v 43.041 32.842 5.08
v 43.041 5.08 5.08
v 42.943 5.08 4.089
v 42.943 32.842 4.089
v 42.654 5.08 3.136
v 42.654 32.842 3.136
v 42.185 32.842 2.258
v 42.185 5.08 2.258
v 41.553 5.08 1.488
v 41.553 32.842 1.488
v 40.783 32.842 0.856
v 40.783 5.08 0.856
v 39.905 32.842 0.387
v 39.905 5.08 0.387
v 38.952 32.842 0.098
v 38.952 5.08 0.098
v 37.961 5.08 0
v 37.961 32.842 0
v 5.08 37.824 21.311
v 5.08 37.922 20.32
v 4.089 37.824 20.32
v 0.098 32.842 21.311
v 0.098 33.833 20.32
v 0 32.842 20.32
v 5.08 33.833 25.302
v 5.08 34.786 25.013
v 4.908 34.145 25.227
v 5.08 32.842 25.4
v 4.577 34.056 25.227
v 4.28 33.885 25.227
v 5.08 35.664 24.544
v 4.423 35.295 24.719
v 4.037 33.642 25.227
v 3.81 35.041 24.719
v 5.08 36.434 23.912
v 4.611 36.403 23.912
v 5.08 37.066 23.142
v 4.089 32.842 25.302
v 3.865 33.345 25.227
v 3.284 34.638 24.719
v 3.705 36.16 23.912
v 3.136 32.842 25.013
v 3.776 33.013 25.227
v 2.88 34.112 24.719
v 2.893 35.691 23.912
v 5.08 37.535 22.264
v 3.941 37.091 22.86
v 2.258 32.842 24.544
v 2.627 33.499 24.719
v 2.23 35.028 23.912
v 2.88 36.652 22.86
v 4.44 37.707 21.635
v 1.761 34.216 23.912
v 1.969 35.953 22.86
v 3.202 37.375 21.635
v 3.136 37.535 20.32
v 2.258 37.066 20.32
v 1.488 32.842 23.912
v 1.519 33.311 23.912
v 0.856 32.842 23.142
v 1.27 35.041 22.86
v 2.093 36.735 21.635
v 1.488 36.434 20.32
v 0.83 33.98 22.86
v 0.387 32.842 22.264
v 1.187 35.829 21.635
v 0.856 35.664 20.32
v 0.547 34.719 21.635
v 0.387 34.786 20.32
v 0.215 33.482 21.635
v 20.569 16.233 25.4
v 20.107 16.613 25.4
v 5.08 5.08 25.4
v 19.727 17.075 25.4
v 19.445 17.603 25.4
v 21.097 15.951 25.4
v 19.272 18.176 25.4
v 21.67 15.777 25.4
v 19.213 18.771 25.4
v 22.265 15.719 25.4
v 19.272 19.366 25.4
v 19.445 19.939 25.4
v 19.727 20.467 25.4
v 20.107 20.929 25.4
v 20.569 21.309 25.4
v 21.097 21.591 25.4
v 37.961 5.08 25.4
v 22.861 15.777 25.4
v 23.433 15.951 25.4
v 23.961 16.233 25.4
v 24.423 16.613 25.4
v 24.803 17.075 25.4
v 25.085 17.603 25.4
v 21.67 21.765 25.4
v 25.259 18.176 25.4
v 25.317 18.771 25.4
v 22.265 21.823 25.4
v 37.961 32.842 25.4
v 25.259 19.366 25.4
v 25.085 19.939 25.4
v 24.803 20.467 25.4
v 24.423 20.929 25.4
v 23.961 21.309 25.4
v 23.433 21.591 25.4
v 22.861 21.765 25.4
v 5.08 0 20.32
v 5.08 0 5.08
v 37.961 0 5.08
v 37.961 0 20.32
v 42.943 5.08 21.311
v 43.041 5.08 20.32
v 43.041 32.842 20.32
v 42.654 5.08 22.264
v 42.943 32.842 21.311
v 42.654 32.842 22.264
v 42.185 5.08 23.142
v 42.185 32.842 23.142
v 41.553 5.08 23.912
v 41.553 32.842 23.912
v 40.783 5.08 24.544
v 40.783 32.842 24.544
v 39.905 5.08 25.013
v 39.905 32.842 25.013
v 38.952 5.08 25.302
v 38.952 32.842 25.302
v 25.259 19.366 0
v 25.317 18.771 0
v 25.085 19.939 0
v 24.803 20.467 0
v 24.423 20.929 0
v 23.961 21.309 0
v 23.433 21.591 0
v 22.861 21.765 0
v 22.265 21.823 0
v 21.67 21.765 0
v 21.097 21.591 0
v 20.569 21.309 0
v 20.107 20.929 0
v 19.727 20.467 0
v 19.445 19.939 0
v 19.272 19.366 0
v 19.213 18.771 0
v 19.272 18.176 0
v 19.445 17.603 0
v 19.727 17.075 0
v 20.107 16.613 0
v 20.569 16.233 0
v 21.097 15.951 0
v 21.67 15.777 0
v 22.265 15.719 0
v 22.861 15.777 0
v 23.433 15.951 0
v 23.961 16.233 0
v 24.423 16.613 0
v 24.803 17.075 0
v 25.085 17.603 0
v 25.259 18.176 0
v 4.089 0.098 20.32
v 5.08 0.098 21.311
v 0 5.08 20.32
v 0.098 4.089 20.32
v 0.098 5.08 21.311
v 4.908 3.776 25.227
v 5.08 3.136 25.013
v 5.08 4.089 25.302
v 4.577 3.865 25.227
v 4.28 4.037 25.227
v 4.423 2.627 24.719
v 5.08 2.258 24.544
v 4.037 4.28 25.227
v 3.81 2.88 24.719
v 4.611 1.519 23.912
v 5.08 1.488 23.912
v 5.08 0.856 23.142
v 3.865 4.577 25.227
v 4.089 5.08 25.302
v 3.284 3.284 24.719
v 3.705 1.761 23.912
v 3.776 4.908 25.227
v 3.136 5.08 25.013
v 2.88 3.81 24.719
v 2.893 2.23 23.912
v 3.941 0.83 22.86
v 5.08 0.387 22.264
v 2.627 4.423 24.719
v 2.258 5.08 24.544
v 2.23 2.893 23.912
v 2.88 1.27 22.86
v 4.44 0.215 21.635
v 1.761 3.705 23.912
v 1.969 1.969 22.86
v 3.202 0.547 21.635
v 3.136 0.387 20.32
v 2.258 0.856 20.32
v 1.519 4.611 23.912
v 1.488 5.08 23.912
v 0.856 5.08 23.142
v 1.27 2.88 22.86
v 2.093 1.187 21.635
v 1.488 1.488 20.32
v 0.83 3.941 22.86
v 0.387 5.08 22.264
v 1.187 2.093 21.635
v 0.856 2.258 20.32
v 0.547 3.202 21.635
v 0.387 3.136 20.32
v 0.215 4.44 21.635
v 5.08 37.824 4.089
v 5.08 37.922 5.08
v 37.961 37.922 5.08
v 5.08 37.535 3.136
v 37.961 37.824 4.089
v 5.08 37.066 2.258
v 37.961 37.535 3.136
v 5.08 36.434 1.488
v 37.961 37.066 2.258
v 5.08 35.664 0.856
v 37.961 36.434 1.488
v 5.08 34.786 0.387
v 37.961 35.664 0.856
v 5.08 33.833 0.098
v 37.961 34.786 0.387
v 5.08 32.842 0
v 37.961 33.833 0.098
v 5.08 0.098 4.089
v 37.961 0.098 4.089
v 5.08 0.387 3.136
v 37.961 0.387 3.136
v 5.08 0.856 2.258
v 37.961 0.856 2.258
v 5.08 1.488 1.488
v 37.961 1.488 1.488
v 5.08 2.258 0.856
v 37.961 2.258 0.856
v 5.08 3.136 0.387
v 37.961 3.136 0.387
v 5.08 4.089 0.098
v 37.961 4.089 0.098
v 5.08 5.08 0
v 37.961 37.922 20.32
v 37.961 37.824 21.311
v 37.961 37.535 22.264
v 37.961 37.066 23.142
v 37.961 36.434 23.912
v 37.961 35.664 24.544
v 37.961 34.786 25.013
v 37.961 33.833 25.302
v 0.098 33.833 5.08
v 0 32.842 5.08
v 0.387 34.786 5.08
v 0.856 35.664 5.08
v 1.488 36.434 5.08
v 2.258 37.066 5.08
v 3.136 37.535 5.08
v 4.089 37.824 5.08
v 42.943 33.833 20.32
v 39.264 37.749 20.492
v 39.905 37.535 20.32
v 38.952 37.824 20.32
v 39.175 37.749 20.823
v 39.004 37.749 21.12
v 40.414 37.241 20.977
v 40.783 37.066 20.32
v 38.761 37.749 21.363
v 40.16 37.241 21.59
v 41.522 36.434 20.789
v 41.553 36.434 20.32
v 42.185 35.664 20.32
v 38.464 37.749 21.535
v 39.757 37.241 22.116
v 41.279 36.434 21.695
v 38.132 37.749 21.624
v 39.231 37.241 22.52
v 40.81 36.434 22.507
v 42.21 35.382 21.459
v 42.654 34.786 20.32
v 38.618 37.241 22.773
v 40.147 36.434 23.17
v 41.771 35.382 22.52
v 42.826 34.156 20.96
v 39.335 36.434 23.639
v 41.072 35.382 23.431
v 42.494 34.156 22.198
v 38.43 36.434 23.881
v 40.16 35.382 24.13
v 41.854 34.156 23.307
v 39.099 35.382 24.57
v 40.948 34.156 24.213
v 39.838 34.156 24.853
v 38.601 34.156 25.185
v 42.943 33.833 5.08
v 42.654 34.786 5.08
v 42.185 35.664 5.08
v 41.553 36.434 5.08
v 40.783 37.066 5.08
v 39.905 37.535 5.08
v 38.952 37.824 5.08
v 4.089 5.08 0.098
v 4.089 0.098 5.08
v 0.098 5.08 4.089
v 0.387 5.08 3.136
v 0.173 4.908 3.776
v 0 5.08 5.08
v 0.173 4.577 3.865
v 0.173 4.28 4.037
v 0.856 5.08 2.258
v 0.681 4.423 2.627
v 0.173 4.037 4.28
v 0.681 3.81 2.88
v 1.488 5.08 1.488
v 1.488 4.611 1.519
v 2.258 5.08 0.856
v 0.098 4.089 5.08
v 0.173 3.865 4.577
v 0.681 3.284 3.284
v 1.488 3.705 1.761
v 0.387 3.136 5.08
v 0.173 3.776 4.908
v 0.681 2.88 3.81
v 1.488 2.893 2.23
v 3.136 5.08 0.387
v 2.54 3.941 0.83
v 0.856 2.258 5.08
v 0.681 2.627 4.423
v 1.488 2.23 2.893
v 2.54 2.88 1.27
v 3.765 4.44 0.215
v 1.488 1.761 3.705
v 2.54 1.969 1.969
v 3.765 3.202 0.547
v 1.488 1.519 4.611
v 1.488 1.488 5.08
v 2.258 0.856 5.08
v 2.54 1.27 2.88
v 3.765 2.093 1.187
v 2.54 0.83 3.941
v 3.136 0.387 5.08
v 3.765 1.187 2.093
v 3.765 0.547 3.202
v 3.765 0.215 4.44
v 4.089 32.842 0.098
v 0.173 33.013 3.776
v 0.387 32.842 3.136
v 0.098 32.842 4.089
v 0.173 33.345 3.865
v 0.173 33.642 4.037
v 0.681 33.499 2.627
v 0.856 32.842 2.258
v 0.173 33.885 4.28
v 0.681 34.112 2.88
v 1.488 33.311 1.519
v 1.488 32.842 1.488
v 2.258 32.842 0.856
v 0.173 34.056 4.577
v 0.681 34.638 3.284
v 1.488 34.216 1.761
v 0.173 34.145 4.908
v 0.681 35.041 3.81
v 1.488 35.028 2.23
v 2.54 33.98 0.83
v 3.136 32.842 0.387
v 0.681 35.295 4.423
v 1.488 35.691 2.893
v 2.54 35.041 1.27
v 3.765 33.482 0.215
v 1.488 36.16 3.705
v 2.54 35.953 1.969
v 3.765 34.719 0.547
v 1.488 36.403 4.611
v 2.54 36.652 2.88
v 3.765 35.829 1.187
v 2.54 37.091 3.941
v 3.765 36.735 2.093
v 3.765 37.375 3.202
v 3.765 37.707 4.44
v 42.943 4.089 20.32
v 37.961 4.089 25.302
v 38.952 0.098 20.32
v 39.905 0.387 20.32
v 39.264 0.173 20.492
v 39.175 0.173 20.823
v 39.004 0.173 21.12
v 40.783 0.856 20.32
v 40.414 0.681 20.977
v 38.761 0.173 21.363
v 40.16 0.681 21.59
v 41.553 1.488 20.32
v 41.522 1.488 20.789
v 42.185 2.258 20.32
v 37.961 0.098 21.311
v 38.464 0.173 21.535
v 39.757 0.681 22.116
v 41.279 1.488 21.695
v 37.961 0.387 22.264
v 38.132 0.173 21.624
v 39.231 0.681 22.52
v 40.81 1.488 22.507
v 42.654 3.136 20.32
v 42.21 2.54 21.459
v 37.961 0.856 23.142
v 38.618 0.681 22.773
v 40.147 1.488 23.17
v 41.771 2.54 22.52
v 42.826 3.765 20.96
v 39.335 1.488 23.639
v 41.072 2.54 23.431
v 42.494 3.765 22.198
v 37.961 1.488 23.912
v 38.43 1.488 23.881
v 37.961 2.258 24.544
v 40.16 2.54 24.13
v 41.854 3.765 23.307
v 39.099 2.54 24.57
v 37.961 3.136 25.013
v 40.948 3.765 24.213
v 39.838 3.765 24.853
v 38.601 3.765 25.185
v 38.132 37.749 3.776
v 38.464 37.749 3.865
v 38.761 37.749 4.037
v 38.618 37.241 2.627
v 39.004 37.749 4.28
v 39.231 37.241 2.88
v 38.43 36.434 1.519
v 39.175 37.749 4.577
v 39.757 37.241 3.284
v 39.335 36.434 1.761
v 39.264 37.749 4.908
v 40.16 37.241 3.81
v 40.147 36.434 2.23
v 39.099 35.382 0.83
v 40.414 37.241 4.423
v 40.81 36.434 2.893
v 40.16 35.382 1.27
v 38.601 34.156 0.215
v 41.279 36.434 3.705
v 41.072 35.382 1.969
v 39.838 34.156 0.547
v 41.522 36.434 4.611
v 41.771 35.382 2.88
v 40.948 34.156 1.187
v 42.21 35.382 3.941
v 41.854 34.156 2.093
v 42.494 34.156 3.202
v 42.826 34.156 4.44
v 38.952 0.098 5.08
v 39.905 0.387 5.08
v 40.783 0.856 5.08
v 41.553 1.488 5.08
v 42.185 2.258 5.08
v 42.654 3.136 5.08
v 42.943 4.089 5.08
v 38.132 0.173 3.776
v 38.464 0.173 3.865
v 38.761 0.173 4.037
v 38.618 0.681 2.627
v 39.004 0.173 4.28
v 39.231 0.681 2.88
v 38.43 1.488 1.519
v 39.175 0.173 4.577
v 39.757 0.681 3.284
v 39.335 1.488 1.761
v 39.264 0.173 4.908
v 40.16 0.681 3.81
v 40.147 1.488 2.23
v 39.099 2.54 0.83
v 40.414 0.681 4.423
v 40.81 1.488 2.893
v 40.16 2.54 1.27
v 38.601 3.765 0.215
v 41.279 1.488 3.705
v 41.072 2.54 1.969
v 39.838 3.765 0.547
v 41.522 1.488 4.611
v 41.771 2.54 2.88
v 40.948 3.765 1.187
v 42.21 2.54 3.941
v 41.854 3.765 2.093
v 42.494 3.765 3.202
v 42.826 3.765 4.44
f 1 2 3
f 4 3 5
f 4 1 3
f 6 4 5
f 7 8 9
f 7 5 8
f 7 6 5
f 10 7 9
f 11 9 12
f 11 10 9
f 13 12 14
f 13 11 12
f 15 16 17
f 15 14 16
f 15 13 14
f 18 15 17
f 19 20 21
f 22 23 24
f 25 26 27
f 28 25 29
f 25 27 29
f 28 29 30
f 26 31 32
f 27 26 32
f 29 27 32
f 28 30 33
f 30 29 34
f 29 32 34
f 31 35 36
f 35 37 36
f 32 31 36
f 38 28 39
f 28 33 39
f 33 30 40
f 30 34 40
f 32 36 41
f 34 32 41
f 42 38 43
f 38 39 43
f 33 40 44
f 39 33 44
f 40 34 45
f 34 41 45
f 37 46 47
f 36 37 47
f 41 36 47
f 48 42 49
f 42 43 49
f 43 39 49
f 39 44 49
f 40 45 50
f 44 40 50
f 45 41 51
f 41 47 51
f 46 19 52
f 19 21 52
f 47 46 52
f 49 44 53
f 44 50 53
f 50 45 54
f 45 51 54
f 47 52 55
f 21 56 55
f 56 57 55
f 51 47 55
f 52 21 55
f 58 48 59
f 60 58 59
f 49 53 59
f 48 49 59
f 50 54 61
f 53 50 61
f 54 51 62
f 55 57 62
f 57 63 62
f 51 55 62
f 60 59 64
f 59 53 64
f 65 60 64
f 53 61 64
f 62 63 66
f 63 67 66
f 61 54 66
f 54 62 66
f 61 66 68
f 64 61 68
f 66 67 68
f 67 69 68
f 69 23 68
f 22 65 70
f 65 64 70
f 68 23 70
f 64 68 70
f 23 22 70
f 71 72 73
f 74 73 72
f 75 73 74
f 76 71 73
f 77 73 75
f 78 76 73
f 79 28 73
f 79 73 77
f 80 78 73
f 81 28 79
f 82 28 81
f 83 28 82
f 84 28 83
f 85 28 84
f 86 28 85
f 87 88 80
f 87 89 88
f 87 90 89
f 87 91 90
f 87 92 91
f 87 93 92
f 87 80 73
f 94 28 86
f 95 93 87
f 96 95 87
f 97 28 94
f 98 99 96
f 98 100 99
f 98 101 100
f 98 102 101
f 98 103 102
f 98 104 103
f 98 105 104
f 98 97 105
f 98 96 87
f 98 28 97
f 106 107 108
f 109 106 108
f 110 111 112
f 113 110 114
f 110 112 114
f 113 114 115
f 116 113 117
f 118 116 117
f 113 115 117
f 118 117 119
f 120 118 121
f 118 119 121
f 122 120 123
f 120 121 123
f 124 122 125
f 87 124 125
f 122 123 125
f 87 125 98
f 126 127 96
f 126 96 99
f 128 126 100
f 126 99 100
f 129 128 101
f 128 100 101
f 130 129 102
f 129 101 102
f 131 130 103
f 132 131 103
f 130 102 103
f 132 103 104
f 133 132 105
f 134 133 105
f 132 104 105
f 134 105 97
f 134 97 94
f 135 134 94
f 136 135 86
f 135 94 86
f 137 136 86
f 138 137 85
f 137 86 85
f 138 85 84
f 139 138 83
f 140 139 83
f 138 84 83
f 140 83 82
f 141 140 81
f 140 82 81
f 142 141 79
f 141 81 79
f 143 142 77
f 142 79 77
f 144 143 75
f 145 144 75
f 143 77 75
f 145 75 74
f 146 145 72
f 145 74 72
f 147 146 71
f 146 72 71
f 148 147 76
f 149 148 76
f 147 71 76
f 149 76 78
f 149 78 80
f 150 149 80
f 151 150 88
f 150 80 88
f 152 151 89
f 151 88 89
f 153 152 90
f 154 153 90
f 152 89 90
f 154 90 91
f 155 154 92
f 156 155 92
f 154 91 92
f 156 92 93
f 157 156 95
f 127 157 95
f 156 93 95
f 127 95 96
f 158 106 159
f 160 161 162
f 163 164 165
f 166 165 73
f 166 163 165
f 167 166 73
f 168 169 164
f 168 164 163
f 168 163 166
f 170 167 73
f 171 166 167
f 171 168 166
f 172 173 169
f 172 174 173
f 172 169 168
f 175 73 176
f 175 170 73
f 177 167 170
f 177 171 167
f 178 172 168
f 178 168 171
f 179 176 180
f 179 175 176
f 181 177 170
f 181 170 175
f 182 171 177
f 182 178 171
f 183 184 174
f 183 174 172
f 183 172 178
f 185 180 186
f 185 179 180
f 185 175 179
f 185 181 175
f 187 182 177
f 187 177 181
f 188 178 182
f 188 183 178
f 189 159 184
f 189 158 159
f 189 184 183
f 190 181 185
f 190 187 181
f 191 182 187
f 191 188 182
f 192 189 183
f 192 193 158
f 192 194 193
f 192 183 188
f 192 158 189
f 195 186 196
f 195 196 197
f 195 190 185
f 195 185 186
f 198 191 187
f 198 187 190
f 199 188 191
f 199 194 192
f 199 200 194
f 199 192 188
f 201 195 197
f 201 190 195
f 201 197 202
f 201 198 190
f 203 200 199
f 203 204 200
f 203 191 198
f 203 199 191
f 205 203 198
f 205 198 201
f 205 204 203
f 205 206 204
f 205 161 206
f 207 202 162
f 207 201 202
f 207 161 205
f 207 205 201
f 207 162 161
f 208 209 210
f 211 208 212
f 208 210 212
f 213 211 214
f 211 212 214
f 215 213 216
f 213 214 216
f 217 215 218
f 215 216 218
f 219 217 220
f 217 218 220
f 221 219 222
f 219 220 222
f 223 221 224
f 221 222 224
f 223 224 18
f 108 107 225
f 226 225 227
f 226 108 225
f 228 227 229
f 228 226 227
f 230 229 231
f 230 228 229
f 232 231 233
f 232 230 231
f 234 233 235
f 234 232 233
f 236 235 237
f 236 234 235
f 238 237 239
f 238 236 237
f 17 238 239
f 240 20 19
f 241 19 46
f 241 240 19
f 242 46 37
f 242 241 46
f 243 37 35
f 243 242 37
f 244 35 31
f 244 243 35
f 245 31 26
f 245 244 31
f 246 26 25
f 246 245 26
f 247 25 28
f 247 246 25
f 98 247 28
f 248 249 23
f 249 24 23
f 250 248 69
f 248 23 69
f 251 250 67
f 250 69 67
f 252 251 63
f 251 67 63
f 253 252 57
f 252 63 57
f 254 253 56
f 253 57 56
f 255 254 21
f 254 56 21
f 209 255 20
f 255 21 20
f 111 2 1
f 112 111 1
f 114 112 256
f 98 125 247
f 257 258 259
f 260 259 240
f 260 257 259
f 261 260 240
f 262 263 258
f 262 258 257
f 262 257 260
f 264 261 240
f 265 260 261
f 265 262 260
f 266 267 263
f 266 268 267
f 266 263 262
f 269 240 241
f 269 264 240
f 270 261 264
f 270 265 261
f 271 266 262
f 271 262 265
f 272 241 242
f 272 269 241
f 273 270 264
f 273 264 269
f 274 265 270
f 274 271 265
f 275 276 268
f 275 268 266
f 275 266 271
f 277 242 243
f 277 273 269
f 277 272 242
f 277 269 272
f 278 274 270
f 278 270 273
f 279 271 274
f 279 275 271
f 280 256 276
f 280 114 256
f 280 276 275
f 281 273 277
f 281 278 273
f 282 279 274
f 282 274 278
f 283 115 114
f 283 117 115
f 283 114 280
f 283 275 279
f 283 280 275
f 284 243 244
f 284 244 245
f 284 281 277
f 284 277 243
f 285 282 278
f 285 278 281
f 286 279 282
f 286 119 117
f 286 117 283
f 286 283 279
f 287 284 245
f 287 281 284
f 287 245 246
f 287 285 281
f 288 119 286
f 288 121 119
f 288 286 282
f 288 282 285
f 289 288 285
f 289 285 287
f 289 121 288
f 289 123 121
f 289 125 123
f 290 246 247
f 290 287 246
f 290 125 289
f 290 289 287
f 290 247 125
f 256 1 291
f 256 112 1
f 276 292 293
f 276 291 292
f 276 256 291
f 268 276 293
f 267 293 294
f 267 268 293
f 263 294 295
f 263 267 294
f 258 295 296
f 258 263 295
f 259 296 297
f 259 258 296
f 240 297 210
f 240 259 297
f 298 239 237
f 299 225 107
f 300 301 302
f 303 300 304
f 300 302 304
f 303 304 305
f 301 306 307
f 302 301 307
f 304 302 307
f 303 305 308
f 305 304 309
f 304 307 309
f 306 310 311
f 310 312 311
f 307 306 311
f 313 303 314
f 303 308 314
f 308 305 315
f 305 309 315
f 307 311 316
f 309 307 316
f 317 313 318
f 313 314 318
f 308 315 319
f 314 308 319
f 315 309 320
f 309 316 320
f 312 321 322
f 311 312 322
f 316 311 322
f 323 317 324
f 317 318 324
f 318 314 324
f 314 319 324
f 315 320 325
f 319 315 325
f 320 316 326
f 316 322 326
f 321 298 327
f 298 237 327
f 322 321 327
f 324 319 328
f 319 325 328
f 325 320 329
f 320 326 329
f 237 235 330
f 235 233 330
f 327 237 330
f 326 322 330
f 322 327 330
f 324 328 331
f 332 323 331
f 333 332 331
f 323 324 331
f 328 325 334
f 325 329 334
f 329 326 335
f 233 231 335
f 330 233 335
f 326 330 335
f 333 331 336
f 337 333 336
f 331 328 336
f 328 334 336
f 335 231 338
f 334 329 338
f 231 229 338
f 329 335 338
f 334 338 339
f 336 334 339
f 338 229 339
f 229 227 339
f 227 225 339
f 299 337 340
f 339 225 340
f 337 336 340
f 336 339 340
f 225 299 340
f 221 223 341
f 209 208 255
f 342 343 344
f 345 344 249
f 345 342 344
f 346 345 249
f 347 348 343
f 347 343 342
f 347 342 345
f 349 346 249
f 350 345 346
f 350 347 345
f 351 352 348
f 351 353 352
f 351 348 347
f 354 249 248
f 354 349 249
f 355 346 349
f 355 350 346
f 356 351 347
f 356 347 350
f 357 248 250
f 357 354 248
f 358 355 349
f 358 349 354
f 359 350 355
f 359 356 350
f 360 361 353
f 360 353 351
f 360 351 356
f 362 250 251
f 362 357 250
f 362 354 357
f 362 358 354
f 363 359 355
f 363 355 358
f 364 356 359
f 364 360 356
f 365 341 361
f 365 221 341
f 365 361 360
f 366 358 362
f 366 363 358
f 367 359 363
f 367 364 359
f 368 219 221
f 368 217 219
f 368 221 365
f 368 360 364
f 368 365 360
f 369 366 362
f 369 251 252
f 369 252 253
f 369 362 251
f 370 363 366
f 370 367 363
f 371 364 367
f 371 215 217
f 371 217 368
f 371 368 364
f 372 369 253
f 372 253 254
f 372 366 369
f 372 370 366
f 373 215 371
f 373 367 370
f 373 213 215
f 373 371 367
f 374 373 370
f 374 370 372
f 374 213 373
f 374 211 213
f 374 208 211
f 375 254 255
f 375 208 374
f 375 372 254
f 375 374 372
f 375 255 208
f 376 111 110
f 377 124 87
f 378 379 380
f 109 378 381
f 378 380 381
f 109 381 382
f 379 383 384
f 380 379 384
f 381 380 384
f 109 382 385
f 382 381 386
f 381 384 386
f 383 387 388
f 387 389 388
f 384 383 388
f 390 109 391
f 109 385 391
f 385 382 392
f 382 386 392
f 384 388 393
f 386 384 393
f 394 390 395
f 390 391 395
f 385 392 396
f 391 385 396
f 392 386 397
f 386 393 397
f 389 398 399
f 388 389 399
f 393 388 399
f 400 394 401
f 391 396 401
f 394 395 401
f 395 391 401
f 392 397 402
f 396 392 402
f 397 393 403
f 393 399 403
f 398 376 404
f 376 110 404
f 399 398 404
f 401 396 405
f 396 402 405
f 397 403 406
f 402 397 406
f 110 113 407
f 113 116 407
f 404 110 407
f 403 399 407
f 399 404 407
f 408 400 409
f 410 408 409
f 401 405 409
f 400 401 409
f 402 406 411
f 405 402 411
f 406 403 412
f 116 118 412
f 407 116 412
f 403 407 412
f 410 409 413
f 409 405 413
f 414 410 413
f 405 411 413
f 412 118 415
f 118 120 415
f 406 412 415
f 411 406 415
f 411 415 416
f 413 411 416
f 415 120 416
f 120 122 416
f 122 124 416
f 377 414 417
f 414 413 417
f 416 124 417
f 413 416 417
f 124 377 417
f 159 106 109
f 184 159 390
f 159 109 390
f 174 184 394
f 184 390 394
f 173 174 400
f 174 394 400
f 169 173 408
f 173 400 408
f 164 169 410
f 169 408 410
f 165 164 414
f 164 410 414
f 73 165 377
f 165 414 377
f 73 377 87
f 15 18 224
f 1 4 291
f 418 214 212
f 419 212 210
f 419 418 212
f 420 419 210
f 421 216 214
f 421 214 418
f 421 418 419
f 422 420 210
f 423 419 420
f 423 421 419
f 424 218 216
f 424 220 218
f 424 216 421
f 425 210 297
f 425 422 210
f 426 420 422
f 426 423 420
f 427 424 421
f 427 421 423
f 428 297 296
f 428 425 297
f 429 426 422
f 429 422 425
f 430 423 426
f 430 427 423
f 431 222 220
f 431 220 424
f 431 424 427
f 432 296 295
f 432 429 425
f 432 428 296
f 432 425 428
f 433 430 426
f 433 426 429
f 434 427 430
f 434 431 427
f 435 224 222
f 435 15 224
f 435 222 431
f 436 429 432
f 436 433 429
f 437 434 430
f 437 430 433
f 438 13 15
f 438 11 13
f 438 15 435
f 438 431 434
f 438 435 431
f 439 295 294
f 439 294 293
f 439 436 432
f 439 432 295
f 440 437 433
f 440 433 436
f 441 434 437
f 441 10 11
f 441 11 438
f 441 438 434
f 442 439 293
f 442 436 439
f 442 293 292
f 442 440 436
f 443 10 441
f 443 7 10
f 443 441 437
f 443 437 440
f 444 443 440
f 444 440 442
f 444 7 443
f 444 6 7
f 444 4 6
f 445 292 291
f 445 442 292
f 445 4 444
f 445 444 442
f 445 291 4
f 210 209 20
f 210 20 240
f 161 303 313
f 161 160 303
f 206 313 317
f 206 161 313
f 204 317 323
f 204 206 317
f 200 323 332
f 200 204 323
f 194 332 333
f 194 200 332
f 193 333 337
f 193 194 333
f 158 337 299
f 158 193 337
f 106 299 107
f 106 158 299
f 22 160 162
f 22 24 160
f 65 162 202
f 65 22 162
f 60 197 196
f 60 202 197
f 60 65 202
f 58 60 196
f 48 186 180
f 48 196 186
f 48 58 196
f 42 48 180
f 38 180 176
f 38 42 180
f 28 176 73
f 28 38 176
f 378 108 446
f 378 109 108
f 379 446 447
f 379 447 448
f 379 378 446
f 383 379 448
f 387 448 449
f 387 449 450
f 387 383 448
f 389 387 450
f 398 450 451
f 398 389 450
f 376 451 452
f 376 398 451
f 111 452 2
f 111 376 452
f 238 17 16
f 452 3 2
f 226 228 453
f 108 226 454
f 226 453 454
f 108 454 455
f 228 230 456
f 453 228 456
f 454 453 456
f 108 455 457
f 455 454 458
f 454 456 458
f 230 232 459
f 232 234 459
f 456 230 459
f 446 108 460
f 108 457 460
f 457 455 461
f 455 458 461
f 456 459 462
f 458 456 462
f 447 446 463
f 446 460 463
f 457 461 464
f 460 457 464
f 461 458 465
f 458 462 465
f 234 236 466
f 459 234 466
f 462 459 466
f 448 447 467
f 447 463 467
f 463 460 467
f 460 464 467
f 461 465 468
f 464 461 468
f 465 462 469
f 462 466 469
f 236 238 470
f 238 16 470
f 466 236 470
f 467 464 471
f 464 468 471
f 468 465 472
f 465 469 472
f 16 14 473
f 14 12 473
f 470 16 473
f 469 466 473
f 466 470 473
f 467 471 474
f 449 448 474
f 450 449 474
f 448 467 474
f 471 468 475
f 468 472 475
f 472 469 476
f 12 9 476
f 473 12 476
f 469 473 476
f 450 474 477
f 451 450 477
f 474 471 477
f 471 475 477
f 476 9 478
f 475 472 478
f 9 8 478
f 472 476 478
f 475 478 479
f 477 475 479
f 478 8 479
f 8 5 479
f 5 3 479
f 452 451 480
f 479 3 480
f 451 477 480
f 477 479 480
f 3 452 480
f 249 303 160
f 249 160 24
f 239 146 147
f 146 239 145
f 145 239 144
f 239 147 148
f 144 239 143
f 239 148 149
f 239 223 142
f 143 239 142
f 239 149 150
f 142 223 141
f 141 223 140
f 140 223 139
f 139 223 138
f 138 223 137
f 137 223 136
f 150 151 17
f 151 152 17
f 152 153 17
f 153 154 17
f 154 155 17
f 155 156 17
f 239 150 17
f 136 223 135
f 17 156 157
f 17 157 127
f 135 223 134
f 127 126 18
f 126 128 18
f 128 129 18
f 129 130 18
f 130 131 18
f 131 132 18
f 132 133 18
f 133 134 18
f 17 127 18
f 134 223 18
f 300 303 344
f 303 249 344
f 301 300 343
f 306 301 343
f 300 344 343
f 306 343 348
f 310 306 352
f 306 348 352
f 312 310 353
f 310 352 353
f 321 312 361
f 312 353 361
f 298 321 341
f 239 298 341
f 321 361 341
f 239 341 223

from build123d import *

# Parameters (mm, degrees)
F0_W     = 43.040663
F0_H     = 37.921667
F1_DEPTH = 25.4
F2_R     = 5.08
F3_R     = 3.052253
F4_DEPTH = 25.4


with BuildPart() as f1:
    # F0 (on Top) → F1 (new body)
    with BuildSketch(Plane.XY):
        with Locations((21.520331, 18.960833)):
            Rectangle(F0_W, F0_H)
    extrude(amount=F1_DEPTH)

    # F2
    f2_edges = [f1.edges().sort_by_distance(p)[0] for p in [
        (43.040663, 18.960834, 0),
        (21.520332, 37.921667, 0),
        (21.520332, 0, 0),
        (0, 18.960834, 0),
        (43.040663, 18.960834, 25.4),
        (43.040663, 37.921667, 12.7),
        (43.040663, 0, 12.7),
        (0, 0, 12.7),
        (0, 37.921667, 12.7),
        (21.520332, 37.921667, 25.4),
        (21.520332, 0, 25.4),
        (0, 18.960834, 25.4),
    ]]
    fillet(f2_edges, radius=F2_R)

    # F3 (on face) → F4 (cut)
    with BuildSketch(Plane.XY.offset(25.4)):
        with Locations((22.265185, 18.770991)):
            Circle(F3_R)
    extrude(amount=-F4_DEPTH, mode=Mode.SUBTRACT)


solid = f1.part
